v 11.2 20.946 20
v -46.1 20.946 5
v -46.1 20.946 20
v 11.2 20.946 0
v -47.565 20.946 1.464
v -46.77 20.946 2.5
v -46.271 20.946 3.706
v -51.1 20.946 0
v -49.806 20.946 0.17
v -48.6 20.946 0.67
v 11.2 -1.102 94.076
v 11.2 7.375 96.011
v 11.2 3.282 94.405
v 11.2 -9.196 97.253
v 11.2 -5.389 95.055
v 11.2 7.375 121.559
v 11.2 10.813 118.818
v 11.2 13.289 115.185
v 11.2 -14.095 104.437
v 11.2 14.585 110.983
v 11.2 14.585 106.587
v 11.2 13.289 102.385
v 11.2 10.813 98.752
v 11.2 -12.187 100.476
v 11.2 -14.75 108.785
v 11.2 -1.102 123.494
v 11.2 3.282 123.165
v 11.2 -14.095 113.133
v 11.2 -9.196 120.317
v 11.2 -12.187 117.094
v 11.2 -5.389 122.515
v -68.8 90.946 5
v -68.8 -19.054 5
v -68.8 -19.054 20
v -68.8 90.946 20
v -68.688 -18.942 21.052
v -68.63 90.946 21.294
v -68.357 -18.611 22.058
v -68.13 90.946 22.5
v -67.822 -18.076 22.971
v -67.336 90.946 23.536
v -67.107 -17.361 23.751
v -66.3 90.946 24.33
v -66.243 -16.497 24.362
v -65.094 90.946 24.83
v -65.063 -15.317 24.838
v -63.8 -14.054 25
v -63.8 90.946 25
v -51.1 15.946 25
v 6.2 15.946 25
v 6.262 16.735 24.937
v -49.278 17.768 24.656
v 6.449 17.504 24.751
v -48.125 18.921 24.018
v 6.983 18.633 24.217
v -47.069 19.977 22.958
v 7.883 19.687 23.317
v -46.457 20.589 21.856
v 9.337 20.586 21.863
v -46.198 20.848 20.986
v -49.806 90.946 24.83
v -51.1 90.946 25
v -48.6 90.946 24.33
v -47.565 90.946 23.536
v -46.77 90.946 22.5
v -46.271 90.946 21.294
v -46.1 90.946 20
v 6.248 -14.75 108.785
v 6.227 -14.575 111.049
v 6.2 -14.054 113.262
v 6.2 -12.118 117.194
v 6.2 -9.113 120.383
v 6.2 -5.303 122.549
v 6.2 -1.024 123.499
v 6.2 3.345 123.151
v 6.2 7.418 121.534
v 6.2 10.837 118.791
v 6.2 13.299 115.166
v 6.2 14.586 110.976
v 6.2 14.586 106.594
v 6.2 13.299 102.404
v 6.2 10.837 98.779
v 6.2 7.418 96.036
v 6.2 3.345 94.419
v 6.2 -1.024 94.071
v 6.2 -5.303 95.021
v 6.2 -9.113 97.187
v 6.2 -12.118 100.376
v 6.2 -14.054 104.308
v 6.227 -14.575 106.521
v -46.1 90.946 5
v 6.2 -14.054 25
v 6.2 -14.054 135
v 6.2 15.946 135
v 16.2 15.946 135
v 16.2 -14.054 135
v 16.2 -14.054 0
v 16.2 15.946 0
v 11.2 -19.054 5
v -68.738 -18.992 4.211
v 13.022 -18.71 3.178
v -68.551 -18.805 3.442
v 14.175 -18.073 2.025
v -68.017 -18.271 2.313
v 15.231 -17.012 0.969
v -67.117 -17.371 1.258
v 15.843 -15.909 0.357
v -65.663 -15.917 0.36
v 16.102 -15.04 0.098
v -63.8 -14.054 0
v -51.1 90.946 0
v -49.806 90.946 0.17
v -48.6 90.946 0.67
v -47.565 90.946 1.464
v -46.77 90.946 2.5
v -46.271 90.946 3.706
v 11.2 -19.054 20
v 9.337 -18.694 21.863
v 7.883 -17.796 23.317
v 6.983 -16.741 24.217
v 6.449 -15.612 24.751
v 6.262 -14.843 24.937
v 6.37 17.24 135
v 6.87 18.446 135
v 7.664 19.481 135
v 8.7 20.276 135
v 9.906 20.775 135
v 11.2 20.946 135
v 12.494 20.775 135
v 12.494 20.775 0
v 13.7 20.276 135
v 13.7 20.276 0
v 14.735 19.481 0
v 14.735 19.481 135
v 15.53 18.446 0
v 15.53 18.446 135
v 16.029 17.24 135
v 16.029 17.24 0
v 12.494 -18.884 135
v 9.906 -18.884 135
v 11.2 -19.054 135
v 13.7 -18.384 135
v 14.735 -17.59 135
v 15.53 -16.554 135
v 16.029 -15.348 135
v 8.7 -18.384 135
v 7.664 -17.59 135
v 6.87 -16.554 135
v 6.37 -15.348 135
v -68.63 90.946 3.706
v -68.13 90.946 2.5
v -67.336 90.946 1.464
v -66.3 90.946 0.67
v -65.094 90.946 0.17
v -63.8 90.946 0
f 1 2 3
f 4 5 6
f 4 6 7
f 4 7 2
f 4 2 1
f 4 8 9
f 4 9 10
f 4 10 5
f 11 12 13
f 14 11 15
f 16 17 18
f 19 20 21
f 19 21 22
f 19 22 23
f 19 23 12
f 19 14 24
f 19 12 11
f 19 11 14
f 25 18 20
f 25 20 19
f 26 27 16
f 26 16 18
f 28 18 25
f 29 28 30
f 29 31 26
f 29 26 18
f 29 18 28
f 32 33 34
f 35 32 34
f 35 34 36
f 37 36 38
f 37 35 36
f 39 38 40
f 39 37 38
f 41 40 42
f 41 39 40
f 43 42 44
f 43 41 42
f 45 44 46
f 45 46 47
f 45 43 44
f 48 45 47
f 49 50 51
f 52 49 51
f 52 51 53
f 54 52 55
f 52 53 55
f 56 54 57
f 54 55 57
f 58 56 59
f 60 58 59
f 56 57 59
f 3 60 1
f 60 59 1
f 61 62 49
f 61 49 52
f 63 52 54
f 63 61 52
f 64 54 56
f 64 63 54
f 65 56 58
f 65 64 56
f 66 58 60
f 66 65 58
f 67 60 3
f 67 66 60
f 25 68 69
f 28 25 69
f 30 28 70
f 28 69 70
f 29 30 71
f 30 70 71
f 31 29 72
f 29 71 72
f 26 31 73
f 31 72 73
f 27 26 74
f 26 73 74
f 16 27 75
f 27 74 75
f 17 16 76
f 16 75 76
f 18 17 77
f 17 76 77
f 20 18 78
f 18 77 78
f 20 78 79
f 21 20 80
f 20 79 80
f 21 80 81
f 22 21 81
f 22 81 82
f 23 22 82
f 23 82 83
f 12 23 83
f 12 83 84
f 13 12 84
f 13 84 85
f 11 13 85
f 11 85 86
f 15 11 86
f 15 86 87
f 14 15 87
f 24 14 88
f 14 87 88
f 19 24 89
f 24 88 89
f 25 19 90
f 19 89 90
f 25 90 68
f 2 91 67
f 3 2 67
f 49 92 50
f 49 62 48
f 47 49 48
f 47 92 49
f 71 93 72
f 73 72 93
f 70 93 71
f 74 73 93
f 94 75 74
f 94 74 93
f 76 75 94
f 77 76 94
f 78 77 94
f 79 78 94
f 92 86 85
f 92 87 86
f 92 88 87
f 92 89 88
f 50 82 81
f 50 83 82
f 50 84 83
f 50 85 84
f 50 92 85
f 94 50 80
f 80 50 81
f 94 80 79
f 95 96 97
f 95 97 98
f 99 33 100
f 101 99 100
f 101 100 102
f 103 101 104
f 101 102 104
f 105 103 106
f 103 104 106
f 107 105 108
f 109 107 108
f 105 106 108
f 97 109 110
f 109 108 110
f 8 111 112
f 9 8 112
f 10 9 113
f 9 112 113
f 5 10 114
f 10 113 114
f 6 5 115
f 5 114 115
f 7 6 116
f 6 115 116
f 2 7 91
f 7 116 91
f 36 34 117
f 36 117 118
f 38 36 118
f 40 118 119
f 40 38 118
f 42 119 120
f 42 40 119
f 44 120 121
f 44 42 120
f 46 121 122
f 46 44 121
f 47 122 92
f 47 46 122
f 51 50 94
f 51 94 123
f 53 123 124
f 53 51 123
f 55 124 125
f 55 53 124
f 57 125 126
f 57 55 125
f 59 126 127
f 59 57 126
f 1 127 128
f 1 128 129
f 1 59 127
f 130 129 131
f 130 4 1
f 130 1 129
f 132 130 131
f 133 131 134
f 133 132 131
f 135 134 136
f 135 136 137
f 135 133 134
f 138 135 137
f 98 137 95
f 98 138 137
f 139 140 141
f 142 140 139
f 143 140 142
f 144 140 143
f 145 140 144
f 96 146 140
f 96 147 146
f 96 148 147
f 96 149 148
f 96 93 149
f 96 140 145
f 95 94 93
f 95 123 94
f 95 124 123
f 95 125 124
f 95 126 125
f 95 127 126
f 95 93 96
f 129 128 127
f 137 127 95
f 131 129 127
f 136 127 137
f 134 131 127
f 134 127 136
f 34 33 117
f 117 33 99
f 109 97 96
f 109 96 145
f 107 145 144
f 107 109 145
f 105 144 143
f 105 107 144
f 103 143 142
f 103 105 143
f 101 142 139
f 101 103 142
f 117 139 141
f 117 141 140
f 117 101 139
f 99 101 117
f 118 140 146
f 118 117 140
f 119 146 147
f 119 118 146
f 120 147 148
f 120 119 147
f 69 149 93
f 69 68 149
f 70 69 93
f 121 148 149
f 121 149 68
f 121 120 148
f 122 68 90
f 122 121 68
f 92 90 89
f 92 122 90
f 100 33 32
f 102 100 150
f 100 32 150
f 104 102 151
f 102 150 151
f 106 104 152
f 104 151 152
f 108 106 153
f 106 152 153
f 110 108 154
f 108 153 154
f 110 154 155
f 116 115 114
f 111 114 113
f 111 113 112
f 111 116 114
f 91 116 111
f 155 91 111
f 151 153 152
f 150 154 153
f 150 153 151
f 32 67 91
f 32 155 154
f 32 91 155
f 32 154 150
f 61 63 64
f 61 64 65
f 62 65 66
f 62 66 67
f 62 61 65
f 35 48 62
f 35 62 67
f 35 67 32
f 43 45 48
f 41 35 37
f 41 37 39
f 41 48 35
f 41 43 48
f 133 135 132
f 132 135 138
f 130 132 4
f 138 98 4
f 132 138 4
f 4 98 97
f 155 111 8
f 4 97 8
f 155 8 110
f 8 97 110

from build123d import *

# Parameters (mm, degrees)
F0_W         = 70
F0_H         = 40
F0_W_2       = 15
F1_DEPTH     = 25
F2_W         = 10
F2_H         = 40
F3_DEPTH     = 110
F4_W         = 22.7000065148
F4_H         = 25
F5_DEPTH     = 70
F6_R         = 14.75
F7_DEPTH     = 5
F8_T1_DEPTH  = 87.5
F8_T3_DEPTH  = 52.2999934852
F8_T5_DEPTH  = 82.5
F8_T7_DEPTH  = 135
F8_T9_DEPTH  = 110
F8_T11_DEPTH = 160
F8_T13_DEPTH = 122.5
F8_T19_DEPTH = 100
F8_T23_DEPTH = 135
F8_T30_DEPTH = 64.7999934852
F8_T34_DEPTH = 135
F8_T41_DEPTH = 64.7999934852
F8_T45_DEPTH = 95


# Not quite as in the source:
# - a fillet or chamfer that OpenCascade refuses, or shapes differently, is made with other operations: its cross-section is extruded or revolved along the edge and cut away or added


with BuildPart() as f1:
    # F0 (on Top) → F1 (new body)
    with BuildSketch(Plane.XY):
        with Locations((-33.8003174961, 0.9457613719)):
            Rectangle(F0_W, F0_H)
        with Locations((8.6996825039, 0.9457613719)):
            Rectangle(F0_W_2, F0_H)
    extrude(amount=F1_DEPTH)

    # F2 (on face) → F3 (join)
    with BuildSketch(Plane.XY.offset(25)):
        with Locations((11.1996825039, 0.9457613719)):
            Rectangle(F2_W, F2_H)
    extrude(amount=F3_DEPTH)

    # F4 (on face) → F5 (join)
    with BuildSketch(Plane(origin=(0, 20.9457613719, 0), x_dir=(-1, 0, 0), z_dir=(0, 1, 0))):
        with Locations((57.4503142387, 12.5)):
            Rectangle(F4_W, F4_H)
    extrude(amount=F5_DEPTH)

    # F6 (on face) → F7 (cut)
    with BuildSketch(Plane(origin=(6.1996825039, 0, 0), x_dir=(0, -1, 0), z_dir=(-1, 0, 0))):
        with Locations((0, 108.7849736214)):
            Circle(F6_R)
    extrude(amount=-F7_DEPTH, mode=Mode.SUBTRACT)

    # F8: fillet of radius 5 on 11 edges, made by hand

    # F8_s2 → F8_t1 (cut)
    with BuildSketch(Plane.YZ.offset(-81.3003174961)):
        with BuildLine():
            ThreePointArc((-19.0542386281, 20), (-17.589772534, 23.5355339059), (-14.0542386281, 25))
            Line((-14.0542386281, 25), (-19.0542386281, 25))
            Line((-19.0542386281, 25), (-19.0542386281, 20))
        make_face()
    extrude(amount=F8_T1_DEPTH, mode=Mode.SUBTRACT)

    # F8_s4 → F8_t3 (cut)
    with BuildSketch(Plane.YZ.offset(-46.1003109813)):
        with BuildLine():
            ThreePointArc((15.9457613719, 25), (19.4812952778, 23.5355339059), (20.9457613719, 20))
            Line((20.9457613719, 20), (20.9457613719, 25))
            Line((20.9457613719, 25), (15.9457613719, 25))
        make_face()
    extrude(amount=F8_T3_DEPTH, mode=Mode.SUBTRACT)

    # F8_s6 → F8_t5 (cut)
    with BuildSketch(Plane.XZ.offset(-103.4457613719)):
        with BuildLine():
            ThreePointArc((-51.1003109813, 25), (-47.5647770753, 23.5355339059), (-46.1003109813, 20))
            Line((-46.1003109813, 20), (-46.1003109813, 25))
            Line((-46.1003109813, 25), (-51.1003109813, 25))
        make_face()
        with BuildLine():
            ThreePointArc((-51.1003109813, 0), (-47.5647770753, 1.4644660941), (-46.1003109813, 5))
            Line((-46.1003109813, 5), (-46.1003109813, 0))
            Line((-46.1003109813, 0), (-51.1003109813, 0))
        make_face()
    extrude(amount=F8_T5_DEPTH, mode=Mode.SUBTRACT)

    # F8_s8 → F8_t7 (cut)
    with BuildSketch(Plane.XZ.offset(-103.4457613719)):
        with BuildLine():
            ThreePointArc((-68.8003174961, 20), (-67.335851402, 23.5355339059), (-63.8003174961, 25))
            Line((-63.8003174961, 25), (-68.8003174961, 25))
            Line((-68.8003174961, 25), (-68.8003174961, 20))
        make_face()
        with BuildLine():
            ThreePointArc((-68.8003174961, 5), (-67.335851402, 1.4644660941), (-63.8003174961, 0))
            Line((-63.8003174961, 0), (-68.8003174961, 0))
            Line((-68.8003174961, 0), (-68.8003174961, 5))
        make_face()
    extrude(amount=F8_T7_DEPTH, mode=Mode.SUBTRACT)

    # F8_s10 → F8_t9 (cut)
    with BuildSketch(Plane.YZ.offset(-81.3003174961)):
        with BuildLine():
            ThreePointArc((-19.0542386281, 5), (-17.589772534, 1.4644660941), (-14.0542386281, 0))
            Line((-14.0542386281, 0), (-19.0542386281, 0))
            Line((-19.0542386281, 0), (-19.0542386281, 5))
        make_face()
    extrude(amount=F8_T9_DEPTH, mode=Mode.SUBTRACT)

    # F8_s12 → F8_t11 (cut)
    with BuildSketch(Plane.XY.offset(-12.5)):
        with BuildLine():
            ThreePointArc((11.1996825039, -19.0542386281), (14.7352164099, -17.589772534), (16.1996825039, -14.0542386281))
            Line((16.1996825039, -14.0542386281), (16.1996825039, -19.0542386281))
            Line((16.1996825039, -19.0542386281), (11.1996825039, -19.0542386281))
        make_face()
        with BuildLine():
            ThreePointArc((16.1996825039, 15.9457613719), (14.7352164099, 19.4812952778), (11.1996825039, 20.9457613719))
            Line((11.1996825039, 20.9457613719), (16.1996825039, 20.9457613719))
            Line((16.1996825039, 20.9457613719), (16.1996825039, 15.9457613719))
        make_face()
    extrude(amount=F8_T11_DEPTH, mode=Mode.SUBTRACT)

    # F8_s14 → F8_t13 (cut)
    with BuildSketch(Plane.XY.offset(25)):
        with BuildLine():
            ThreePointArc((11.1996825039, -19.0542386281), (7.664148598, -17.589772534), (6.1996825039, -14.0542386281))
            Line((6.1996825039, -14.0542386281), (6.1996825039, -19.0542386281))
            Line((6.1996825039, -19.0542386281), (11.1996825039, -19.0542386281))
        make_face()
        with BuildLine():
            ThreePointArc((6.1996825039, 15.9457613719), (7.664148598, 19.4812952778), (11.1996825039, 20.9457613719))
            Line((11.1996825039, 20.9457613719), (6.1996825039, 20.9457613719))
            Line((6.1996825039, 20.9457613719), (6.1996825039, 15.9457613719))
        make_face()
    extrude(amount=F8_T13_DEPTH, mode=Mode.SUBTRACT)


with BuildPart() as f8_tool17:
    # F8_s18 → F8_t19 (new body)
    with BuildSketch(Plane.YZ.offset(-81.3003174961)):
        with BuildLine():
            ThreePointArc((-19.0542386281, 20), (-17.589772534, 23.5355339059), (-14.0542386281, 25))
            Line((-14.0542386281, 25), (-19.0542386281, 25))
            Line((-19.0542386281, 25), (-19.0542386281, 20))
        make_face()
    extrude(amount=F8_T19_DEPTH)

    split(bisect_by=Plane.YZ.offset(6.1996825039), keep=Keep.TOP)


with BuildPart() as f8_tool21:
    # F8_s22 → F8_t23 (new body)
    with BuildSketch(Plane.XY.offset(12.5)):
        with BuildLine():
            ThreePointArc((11.1996825039, -19.0542386281), (7.664148598, -17.589772534), (6.1996825039, -14.0542386281))
            Line((6.1996825039, -14.0542386281), (6.1996825039, -19.0542386281))
            Line((6.1996825039, -19.0542386281), (11.1996825039, -19.0542386281))
        make_face()
    extrude(amount=F8_T23_DEPTH)

    split(bisect_by=Plane.XY.offset(25), keep=Keep.BOTTOM)


with BuildPart() as f8_tool17_1:
    add(f8_tool17.part)

    # F8_t25: intersect F8_tool21
    add(f8_tool21.part, mode=Mode.INTERSECT)


with BuildPart() as f1_1:
    add(f1.part)

    # F8_t15: cut F8_tool17
    add(f8_tool17_1.part, mode=Mode.SUBTRACT)


with BuildPart() as f8_tool28:
    # F8_s29 → F8_t30 (new body)
    with BuildSketch(Plane.YZ.offset(18.6996825039)):
        with BuildLine():
            ThreePointArc((15.9457613719, 25), (19.4812952778, 23.5355339059), (20.9457613719, 20))
            Line((20.9457613719, 20), (20.9457613719, 25))
            Line((20.9457613719, 25), (15.9457613719, 25))
        make_face()
    extrude(amount=-F8_T30_DEPTH)

    split(bisect_by=Plane.YZ.offset(6.1996825039), keep=Keep.TOP)


with BuildPart() as f8_tool32:
    # F8_s33 → F8_t34 (new body)
    with BuildSketch(Plane.XY.offset(12.5)):
        with BuildLine():
            ThreePointArc((6.1996825039, 15.9457613719), (7.664148598, 19.4812952778), (11.1996825039, 20.9457613719))
            Line((11.1996825039, 20.9457613719), (6.1996825039, 20.9457613719))
            Line((6.1996825039, 20.9457613719), (6.1996825039, 15.9457613719))
        make_face()
    extrude(amount=F8_T34_DEPTH)

    split(bisect_by=Plane.XY.offset(25), keep=Keep.BOTTOM)


with BuildPart() as f8_tool28_1:
    add(f8_tool28.part)

    # F8_t36: intersect F8_tool32
    add(f8_tool32.part, mode=Mode.INTERSECT)


with BuildPart() as f1_2:
    add(f1_1.part)

    # F8_t26: cut F8_tool28
    add(f8_tool28_1.part, mode=Mode.SUBTRACT)


with BuildPart() as f8_tool39:
    # F8_s40 → F8_t41 (new body)
    with BuildSketch(Plane.YZ.offset(6.1996825039)):
        with BuildLine():
            ThreePointArc((15.9457613719, 25), (19.4812952778, 23.5355339059), (20.9457613719, 20))
            Line((20.9457613719, 20), (20.9457613719, 25))
            Line((20.9457613719, 25), (15.9457613719, 25))
        make_face()
    extrude(amount=-F8_T41_DEPTH)

    split(bisect_by=Plane.YZ.offset(-46.1003109813), keep=Keep.BOTTOM)


with BuildPart() as f8_tool43:
    # F8_s44 → F8_t45 (new body)
    with BuildSketch(Plane.XZ.offset(-8.4457613719)):
        with BuildLine():
            ThreePointArc((-51.1003109813, 25), (-47.5647770753, 23.5355339059), (-46.1003109813, 20))
            Line((-46.1003109813, 20), (-46.1003109813, 25))
            Line((-46.1003109813, 25), (-51.1003109813, 25))
        make_face()
    extrude(amount=-F8_T45_DEPTH)

    split(bisect_by=Plane.XZ.offset(-20.9457613719), keep=Keep.TOP)


with BuildPart() as f8_tool39_1:
    add(f8_tool39.part)

    # F8_t47: intersect F8_tool43
    add(f8_tool43.part, mode=Mode.INTERSECT)


with BuildPart() as f1_3:
    add(f1_2.part)

    # F8_t37: cut F8_tool39
    add(f8_tool39_1.part, mode=Mode.SUBTRACT)


solid = f1_3.part
